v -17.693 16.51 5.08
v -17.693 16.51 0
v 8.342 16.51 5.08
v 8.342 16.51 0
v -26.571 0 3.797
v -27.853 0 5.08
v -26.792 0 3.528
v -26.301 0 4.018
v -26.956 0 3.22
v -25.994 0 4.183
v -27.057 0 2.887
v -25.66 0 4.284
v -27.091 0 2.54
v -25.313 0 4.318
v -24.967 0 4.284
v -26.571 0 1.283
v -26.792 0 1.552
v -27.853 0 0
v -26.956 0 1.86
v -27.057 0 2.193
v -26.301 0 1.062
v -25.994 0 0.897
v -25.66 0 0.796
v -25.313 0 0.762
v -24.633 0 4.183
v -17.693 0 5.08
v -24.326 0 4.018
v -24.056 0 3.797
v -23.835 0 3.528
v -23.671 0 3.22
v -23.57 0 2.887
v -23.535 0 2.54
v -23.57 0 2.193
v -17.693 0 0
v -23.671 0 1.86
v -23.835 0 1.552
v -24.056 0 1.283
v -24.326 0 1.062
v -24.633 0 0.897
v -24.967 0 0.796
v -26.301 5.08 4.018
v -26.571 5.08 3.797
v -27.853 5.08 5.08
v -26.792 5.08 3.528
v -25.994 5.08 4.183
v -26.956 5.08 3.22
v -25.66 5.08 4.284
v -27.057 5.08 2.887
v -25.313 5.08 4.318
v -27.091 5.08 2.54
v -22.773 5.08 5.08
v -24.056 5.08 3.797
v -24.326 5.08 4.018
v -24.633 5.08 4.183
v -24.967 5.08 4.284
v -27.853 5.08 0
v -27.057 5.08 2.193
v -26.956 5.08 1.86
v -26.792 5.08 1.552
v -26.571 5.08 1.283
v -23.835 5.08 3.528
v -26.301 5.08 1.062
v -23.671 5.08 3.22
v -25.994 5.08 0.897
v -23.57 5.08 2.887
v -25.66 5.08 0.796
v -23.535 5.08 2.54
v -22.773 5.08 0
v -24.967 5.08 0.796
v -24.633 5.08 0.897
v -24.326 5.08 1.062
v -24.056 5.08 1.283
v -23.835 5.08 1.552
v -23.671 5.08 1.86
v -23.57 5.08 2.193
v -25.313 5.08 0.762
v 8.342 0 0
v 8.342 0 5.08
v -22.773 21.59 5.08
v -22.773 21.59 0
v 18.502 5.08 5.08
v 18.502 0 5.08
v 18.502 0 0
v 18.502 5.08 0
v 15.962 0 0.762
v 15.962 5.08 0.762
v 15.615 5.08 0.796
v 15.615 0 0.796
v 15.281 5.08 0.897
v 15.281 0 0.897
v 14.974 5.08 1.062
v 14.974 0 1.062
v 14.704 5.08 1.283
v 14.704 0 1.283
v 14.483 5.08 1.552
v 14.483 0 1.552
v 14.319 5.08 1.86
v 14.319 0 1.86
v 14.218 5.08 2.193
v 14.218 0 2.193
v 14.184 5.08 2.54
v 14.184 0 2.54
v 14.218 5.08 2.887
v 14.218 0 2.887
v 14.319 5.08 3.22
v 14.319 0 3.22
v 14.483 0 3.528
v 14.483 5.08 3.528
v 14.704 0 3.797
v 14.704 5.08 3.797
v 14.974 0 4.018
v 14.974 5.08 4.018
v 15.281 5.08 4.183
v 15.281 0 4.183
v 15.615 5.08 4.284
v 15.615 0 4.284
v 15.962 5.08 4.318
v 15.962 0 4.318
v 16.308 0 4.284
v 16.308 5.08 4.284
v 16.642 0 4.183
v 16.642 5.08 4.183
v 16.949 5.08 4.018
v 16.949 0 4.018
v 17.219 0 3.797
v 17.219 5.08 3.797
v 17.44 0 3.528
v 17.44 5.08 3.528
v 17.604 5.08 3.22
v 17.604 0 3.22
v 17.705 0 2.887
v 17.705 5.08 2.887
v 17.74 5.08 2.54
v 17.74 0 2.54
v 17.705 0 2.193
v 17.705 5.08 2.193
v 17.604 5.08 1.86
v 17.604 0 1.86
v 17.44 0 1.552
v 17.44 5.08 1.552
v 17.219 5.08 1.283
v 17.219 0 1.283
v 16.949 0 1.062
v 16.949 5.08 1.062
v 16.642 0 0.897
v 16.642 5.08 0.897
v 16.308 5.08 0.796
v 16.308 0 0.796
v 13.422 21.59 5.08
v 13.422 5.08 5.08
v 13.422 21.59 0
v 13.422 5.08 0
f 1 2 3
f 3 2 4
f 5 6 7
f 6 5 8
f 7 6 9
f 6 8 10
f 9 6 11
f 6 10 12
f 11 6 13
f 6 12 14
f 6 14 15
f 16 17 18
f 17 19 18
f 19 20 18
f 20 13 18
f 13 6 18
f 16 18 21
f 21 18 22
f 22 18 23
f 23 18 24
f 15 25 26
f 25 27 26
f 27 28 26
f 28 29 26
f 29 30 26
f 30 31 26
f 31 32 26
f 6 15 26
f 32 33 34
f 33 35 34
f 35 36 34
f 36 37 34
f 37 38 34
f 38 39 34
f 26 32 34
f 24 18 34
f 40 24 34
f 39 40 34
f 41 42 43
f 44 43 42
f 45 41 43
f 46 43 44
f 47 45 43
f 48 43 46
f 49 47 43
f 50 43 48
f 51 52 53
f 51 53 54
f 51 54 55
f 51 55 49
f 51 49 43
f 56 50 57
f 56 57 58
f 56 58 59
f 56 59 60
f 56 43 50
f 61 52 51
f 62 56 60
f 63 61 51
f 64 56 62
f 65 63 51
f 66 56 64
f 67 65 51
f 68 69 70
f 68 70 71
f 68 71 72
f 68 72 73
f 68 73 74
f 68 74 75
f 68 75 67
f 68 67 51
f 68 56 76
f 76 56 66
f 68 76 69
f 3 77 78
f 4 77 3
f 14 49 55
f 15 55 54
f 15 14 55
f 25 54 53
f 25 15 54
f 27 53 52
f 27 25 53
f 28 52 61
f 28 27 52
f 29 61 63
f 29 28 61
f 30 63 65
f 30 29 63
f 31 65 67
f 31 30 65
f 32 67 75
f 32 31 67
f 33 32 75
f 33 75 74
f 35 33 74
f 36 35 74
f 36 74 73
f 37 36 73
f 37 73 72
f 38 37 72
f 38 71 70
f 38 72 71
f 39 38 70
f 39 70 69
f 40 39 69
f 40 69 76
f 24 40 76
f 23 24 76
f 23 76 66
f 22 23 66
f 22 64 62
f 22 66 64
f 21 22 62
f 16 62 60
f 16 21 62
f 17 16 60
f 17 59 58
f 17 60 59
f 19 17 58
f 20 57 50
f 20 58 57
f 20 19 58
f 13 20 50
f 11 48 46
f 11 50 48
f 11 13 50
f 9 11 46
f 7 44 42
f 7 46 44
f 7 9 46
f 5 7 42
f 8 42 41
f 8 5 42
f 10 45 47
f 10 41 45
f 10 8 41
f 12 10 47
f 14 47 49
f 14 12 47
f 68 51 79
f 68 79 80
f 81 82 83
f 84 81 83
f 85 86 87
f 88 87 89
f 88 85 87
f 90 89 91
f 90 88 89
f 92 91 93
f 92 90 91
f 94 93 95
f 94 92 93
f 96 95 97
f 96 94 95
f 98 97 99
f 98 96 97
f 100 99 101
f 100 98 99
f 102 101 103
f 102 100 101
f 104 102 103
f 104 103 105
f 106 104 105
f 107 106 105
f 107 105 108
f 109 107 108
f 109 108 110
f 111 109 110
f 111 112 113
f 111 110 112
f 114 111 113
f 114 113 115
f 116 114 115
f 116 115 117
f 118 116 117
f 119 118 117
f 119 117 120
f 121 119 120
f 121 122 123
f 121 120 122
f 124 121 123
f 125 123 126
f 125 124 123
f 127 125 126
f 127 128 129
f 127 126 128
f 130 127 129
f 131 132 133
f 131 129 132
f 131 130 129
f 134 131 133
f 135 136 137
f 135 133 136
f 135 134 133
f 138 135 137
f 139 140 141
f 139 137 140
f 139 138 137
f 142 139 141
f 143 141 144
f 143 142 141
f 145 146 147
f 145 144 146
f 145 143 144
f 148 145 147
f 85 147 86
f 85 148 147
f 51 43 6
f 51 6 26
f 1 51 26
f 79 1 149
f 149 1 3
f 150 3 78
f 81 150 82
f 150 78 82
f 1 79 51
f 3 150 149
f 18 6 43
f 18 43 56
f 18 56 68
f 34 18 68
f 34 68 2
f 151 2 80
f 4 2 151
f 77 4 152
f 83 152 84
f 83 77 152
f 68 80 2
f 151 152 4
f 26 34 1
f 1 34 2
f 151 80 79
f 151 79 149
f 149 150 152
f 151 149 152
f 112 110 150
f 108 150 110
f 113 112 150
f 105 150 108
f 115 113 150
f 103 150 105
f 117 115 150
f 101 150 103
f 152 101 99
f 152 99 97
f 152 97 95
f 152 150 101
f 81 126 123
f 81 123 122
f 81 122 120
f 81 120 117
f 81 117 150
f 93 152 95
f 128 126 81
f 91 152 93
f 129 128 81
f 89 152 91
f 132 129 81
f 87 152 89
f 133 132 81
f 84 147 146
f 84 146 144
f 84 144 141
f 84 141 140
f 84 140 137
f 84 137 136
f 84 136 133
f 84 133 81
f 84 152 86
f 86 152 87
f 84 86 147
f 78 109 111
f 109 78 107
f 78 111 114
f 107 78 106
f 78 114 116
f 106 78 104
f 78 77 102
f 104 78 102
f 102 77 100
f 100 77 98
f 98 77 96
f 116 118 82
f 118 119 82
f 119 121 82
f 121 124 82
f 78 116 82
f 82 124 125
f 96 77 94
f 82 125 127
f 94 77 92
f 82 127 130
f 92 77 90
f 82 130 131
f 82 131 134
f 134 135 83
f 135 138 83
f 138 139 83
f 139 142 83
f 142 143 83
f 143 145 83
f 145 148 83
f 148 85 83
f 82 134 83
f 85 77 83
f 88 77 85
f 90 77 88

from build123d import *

# Parameters (mm, degrees)
SKETCH1_W           = 36.195
SKETCH1_H           = 5.08
BOSS_EXTRUDE1_DEPTH = 21.59
SKETCH3_W           = 26.035
SKETCH3_H           = 16.51
CUT_EXTRUDE1_DEPTH  = 16.51
SKETCH5_W           = 5.08
SKETCH5_H           = 5.08
BOSS_EXTRUDE2_DEPTH = 5.08
SKETCH6_R           = 1.778
CUT_EXTRUDE2_DEPTH  = 9.144


with BuildPart() as part:
    # Sketch1 → Boss-Extrude1 (new body)
    with BuildSketch(Plane(origin=(0, 0, 0), x_dir=(1, 0, 0), z_dir=(0, 1, 0))):
        with Locations((-4.675909091, -2.54)):
            Rectangle(SKETCH1_W, SKETCH1_H)
    extrude(amount=BOSS_EXTRUDE1_DEPTH)

    # Sketch3 → Cut-Extrude1 (cut)
    with BuildSketch(Plane.XY):
        with Locations((-4.675909091, 8.255)):
            Rectangle(SKETCH3_W, SKETCH3_H)
    extrude(amount=CUT_EXTRUDE1_DEPTH, mode=Mode.SUBTRACT)

    # Sketch5 → Boss-Extrude2 (add)
    with BuildSketch(Plane(origin=(0, 0, 0), x_dir=(1, 0, 0), z_dir=(0, 1, 0))):
        with Locations((-25.313409091, -2.54)):
            Rectangle(SKETCH5_W, SKETCH5_H)
        with Locations((15.961590909, -2.54)):
            Rectangle(SKETCH5_W, SKETCH5_H)
    extrude(amount=BOSS_EXTRUDE2_DEPTH)

    # Sketch6 → Cut-Extrude2 (cut)
    with BuildSketch(Plane(origin=(0, 0, 0), x_dir=(1, 0, 0), z_dir=(0, 1, 0))):
        with Locations(Location((-25.313409091, -2.54, 0), (0, 0, 270))):
            Circle(SKETCH6_R)
        with Locations(Location((15.961590909, -2.54, 0), (0, 0, 90))):
            Circle(SKETCH6_R)
    extrude(amount=CUT_EXTRUDE2_DEPTH, mode=Mode.SUBTRACT)


solid = part.part
